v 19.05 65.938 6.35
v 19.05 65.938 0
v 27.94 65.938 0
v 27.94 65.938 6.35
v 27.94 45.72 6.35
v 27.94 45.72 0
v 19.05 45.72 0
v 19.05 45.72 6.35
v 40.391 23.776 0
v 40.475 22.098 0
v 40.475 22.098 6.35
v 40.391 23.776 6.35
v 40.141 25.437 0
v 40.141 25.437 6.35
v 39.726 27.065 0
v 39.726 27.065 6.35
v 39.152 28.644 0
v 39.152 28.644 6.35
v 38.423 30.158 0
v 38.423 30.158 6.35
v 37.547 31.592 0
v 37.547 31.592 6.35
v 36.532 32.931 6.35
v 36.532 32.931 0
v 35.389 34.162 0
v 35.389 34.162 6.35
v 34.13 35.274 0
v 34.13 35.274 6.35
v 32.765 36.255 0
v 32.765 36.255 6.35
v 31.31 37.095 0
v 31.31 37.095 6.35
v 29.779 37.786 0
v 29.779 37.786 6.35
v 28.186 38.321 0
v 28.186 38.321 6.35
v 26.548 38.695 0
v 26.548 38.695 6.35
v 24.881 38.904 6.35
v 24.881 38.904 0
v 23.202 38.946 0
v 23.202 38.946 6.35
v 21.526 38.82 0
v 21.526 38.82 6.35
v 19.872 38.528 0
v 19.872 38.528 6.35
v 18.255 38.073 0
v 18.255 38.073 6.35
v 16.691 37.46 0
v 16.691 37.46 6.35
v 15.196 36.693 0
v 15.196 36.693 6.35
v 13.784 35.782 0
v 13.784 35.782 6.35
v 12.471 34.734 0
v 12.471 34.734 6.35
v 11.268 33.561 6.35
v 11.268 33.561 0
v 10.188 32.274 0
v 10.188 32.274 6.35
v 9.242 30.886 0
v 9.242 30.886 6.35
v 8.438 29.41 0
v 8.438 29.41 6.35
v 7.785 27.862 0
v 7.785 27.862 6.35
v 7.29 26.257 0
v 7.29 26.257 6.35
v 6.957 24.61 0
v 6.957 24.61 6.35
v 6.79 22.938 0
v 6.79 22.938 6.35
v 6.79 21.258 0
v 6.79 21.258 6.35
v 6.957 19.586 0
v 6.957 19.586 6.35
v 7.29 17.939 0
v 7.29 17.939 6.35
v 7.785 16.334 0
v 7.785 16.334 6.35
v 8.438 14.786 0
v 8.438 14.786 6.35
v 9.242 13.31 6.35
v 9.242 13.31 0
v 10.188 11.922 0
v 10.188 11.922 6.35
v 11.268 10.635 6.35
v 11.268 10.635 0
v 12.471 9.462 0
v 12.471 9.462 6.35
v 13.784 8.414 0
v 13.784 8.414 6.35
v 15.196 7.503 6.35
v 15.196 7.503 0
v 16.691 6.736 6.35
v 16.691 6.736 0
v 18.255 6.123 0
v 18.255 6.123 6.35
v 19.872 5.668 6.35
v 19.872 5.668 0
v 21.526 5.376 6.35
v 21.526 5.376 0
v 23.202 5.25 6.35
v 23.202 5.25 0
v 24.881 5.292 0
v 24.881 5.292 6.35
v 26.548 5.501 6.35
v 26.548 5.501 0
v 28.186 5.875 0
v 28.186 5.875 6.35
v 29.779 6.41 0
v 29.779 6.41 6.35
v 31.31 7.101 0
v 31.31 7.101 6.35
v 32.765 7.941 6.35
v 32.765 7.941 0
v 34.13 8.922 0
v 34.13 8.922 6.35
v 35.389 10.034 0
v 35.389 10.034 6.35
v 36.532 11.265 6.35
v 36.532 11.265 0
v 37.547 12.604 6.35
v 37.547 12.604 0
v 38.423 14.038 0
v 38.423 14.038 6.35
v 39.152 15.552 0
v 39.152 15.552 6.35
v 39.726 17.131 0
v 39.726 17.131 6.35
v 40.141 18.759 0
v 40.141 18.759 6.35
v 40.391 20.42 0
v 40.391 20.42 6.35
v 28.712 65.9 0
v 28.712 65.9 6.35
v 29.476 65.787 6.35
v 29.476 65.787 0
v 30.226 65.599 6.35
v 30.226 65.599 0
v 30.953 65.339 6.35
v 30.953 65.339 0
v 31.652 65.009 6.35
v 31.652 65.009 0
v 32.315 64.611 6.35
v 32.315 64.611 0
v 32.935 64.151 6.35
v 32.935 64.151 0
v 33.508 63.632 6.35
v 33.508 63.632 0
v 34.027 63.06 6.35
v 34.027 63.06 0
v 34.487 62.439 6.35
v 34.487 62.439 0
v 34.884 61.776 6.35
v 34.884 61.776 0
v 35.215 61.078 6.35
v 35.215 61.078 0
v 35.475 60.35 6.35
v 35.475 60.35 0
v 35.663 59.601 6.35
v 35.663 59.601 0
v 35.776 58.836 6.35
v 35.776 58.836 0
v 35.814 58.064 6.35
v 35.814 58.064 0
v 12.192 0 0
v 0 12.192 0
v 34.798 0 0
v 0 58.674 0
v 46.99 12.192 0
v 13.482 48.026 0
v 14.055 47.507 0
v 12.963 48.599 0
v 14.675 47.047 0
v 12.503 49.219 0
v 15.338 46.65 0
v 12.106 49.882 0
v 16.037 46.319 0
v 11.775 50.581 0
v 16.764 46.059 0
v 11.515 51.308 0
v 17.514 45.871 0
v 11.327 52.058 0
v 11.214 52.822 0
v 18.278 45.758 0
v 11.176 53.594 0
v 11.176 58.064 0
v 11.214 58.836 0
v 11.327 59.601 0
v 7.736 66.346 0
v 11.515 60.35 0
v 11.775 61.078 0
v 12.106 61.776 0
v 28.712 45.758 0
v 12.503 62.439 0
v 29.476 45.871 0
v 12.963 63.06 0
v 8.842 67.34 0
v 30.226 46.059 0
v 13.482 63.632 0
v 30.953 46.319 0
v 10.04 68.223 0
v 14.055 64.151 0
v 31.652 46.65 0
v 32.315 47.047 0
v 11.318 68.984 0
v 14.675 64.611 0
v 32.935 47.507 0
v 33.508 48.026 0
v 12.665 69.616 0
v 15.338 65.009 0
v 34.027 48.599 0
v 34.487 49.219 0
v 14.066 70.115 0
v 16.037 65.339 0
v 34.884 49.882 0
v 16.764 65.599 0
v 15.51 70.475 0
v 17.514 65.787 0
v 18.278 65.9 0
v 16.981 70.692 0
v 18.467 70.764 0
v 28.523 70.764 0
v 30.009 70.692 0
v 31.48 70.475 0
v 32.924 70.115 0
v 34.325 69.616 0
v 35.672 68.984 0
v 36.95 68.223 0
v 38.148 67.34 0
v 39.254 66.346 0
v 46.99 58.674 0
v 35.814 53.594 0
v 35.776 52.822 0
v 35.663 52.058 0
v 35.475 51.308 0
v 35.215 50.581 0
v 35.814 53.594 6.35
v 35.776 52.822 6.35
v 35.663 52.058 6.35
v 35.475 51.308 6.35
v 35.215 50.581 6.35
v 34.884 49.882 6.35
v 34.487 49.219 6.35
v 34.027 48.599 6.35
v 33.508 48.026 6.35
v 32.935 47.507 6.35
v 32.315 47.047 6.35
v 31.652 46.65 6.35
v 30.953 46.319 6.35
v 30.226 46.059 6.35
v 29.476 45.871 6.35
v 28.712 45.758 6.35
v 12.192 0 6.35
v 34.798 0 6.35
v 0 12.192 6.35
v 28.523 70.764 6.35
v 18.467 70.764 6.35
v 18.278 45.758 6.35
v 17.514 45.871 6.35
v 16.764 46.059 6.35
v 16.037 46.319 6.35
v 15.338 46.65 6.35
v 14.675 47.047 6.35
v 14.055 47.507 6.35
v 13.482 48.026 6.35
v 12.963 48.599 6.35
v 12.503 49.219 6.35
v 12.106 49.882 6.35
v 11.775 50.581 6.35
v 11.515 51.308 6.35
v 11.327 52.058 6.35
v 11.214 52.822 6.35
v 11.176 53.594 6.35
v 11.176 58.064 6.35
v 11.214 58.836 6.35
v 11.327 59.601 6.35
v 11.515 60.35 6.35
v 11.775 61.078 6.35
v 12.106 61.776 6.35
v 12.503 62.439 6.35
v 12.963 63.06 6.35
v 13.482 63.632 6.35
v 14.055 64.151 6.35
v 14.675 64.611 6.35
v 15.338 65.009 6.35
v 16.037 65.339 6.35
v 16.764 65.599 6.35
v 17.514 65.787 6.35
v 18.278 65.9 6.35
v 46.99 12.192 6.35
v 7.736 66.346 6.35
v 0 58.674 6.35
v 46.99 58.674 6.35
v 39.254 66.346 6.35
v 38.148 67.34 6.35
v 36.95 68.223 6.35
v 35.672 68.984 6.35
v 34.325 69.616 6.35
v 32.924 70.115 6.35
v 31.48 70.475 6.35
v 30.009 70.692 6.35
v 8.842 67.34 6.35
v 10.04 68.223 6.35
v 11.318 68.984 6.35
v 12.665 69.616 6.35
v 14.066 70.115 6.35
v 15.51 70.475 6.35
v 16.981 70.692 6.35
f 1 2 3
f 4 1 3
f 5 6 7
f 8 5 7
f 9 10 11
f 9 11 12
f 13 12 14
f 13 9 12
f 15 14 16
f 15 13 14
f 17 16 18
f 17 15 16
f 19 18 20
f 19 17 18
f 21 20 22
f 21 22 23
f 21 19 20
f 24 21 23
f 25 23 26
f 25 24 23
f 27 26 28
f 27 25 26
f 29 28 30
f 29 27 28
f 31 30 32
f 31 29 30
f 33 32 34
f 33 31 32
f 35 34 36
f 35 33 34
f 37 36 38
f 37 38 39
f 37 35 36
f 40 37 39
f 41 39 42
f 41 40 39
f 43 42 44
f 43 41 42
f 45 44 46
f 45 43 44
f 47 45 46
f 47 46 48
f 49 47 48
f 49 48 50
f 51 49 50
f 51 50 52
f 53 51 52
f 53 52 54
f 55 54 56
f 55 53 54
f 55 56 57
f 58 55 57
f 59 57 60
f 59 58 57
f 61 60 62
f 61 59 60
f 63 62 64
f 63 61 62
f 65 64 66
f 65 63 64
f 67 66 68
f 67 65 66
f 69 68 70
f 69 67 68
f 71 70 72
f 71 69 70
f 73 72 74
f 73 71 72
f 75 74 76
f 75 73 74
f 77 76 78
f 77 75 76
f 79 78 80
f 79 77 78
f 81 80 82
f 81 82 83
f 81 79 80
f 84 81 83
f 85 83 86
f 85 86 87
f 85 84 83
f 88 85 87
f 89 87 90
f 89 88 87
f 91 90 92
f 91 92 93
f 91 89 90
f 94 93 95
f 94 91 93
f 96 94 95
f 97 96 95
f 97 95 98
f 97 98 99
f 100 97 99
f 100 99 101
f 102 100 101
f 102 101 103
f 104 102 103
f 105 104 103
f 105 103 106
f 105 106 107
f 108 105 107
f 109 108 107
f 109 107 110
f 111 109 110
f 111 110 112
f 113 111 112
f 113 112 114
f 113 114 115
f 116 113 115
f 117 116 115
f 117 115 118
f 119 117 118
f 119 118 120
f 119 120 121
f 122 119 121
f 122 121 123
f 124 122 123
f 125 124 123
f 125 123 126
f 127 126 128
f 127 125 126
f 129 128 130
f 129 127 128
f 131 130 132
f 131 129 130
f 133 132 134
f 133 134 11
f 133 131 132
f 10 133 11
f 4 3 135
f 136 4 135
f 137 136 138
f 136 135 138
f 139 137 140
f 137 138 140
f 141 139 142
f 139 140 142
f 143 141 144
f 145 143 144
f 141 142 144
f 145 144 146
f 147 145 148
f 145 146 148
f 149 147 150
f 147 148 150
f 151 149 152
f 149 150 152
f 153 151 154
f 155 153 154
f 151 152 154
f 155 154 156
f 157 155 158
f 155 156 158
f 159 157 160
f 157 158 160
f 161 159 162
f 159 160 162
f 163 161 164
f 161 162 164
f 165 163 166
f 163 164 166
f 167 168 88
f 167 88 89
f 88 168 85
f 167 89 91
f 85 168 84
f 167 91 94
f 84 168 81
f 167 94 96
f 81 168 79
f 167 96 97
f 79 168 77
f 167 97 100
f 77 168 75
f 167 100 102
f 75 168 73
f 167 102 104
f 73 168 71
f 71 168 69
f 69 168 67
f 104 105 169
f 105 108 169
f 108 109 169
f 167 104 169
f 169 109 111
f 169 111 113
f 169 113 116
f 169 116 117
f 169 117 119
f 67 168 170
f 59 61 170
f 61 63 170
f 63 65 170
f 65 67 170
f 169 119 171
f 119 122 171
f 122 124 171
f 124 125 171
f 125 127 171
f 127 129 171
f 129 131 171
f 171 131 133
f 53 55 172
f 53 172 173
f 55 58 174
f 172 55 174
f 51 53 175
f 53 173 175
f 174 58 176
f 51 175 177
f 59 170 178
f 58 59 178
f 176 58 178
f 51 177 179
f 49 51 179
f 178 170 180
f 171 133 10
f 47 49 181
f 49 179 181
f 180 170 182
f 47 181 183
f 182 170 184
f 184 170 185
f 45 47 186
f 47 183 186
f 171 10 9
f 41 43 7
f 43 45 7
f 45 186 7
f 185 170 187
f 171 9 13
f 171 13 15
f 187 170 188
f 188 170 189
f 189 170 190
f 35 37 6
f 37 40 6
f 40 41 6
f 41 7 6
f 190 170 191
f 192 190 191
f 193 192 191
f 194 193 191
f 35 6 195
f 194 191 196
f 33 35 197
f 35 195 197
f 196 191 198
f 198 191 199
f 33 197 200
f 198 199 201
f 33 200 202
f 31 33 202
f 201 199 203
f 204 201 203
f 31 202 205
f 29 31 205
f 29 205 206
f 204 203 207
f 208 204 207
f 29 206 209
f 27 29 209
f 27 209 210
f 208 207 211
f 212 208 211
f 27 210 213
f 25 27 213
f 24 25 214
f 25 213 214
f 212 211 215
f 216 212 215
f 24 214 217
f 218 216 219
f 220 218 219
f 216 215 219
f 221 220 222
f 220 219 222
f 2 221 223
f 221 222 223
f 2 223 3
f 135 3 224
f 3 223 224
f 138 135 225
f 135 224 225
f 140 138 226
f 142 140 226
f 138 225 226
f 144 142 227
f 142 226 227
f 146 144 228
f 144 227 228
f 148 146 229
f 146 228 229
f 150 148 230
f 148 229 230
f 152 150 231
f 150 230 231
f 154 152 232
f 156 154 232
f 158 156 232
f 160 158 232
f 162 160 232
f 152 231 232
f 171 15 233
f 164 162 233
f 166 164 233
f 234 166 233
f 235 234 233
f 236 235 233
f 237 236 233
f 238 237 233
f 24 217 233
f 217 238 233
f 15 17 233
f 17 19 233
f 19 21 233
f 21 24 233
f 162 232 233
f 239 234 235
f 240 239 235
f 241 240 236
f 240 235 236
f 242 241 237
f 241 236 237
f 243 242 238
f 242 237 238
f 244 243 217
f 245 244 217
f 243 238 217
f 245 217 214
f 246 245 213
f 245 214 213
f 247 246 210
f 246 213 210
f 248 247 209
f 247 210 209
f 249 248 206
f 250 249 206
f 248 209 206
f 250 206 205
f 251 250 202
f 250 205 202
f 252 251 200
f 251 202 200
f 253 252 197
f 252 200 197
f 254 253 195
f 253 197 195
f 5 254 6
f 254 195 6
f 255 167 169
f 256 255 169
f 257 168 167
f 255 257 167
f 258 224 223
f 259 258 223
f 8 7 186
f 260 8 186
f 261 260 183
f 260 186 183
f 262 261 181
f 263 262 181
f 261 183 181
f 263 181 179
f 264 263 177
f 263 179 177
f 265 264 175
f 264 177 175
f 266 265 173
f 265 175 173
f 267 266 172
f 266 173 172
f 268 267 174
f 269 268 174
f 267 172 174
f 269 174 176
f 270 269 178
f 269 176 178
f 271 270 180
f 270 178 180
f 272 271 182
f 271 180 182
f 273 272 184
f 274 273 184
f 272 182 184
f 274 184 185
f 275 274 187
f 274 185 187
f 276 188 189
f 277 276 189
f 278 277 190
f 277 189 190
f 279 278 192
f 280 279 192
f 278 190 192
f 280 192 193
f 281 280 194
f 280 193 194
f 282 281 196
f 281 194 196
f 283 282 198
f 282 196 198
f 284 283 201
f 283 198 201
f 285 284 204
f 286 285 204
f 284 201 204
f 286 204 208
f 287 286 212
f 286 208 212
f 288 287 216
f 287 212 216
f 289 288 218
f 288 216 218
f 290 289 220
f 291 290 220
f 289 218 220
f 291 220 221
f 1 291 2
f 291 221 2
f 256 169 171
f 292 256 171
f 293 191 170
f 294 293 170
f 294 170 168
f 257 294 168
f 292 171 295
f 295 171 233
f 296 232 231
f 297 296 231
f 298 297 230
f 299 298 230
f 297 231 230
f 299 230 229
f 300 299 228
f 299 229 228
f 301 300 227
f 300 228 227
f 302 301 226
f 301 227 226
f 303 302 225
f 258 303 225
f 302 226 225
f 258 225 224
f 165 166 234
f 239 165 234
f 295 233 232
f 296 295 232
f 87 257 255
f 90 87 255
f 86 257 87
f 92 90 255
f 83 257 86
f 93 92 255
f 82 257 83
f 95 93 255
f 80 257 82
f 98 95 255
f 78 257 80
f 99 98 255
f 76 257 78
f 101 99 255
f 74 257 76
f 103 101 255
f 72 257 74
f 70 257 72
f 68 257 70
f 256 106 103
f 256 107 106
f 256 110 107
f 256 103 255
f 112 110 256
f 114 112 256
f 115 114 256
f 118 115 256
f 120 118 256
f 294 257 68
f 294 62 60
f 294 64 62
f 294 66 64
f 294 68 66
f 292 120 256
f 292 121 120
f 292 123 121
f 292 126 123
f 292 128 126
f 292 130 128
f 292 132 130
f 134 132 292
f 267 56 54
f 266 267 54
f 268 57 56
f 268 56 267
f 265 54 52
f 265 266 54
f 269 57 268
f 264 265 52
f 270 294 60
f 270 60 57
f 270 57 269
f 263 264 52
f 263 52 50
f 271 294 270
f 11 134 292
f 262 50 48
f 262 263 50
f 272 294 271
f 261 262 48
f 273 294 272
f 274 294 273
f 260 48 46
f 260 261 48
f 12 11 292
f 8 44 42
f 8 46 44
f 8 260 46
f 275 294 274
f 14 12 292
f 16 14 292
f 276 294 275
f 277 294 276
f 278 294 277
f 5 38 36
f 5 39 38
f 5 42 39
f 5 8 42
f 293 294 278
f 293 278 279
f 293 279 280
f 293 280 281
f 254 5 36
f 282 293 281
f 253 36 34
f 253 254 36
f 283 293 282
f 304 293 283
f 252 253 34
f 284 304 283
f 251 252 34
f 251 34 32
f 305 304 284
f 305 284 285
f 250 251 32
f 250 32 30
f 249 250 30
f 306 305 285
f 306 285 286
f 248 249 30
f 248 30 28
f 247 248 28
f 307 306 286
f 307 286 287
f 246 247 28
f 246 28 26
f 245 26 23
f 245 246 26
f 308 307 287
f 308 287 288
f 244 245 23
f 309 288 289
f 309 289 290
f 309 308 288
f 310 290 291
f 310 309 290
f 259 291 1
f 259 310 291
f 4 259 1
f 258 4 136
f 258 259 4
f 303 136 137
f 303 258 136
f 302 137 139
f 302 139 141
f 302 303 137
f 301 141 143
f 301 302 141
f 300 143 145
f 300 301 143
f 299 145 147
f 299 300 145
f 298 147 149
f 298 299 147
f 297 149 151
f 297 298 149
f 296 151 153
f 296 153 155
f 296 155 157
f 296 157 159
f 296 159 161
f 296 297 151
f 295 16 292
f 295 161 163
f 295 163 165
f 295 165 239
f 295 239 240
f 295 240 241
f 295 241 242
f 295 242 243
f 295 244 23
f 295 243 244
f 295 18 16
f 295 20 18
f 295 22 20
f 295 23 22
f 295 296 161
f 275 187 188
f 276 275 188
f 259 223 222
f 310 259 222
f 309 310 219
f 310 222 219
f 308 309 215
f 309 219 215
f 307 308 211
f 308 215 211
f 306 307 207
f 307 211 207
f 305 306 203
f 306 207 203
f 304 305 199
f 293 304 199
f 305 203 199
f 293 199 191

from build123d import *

# Parameters (mm, degrees)
F0_R     = 16.8529
F1_DEPTH = 6.35


with BuildPart() as f1:
    # F0 (on Top) → F1 (new body)
    with BuildSketch(Plane.XY):
        with BuildLine():
            Line((0, 12.192), (12.192, 0))
            Line((12.192, 0), (34.798, 0))
            Line((34.798, 0), (46.99, 12.192))
            Line((46.99, 12.192), (46.99, 58.674))
            Line((46.99, 58.674), (39.25383, 66.345702))
            ThreePointArc((39.25383, 66.345702), (34.325333, 69.616494), (28.522706, 70.7644))
            Line((28.522706, 70.7644), (18.467294, 70.7644))
            ThreePointArc((18.467294, 70.7644), (12.664667, 69.616494), (7.73617, 66.345702))
            Line((7.73617, 66.345702), (0, 58.674))
            Line((0, 58.674), (0, 12.192))
        make_face()
        with Locations((23.622, 22.098)):
            Circle(F0_R, mode=Mode.SUBTRACT)
        with BuildLine():
            ThreePointArc((11.176, 58.0644), (13.482241, 63.632159), (19.05, 65.9384))
            Line((19.05, 65.9384), (27.94, 65.9384))
            ThreePointArc((27.94, 65.9384), (33.507759, 63.632159), (35.814, 58.0644))
            Line((35.814, 58.0644), (35.814, 53.594))
            ThreePointArc((35.814, 53.594), (33.507759, 48.026241), (27.94, 45.72))
            Line((27.94, 45.72), (19.05, 45.72))
            ThreePointArc((19.05, 45.72), (13.482241, 48.026241), (11.176, 53.594))
            Line((11.176, 53.594), (11.176, 58.0644))
        make_face(mode=Mode.SUBTRACT)
    extrude(amount=F1_DEPTH)


solid = f1.part
